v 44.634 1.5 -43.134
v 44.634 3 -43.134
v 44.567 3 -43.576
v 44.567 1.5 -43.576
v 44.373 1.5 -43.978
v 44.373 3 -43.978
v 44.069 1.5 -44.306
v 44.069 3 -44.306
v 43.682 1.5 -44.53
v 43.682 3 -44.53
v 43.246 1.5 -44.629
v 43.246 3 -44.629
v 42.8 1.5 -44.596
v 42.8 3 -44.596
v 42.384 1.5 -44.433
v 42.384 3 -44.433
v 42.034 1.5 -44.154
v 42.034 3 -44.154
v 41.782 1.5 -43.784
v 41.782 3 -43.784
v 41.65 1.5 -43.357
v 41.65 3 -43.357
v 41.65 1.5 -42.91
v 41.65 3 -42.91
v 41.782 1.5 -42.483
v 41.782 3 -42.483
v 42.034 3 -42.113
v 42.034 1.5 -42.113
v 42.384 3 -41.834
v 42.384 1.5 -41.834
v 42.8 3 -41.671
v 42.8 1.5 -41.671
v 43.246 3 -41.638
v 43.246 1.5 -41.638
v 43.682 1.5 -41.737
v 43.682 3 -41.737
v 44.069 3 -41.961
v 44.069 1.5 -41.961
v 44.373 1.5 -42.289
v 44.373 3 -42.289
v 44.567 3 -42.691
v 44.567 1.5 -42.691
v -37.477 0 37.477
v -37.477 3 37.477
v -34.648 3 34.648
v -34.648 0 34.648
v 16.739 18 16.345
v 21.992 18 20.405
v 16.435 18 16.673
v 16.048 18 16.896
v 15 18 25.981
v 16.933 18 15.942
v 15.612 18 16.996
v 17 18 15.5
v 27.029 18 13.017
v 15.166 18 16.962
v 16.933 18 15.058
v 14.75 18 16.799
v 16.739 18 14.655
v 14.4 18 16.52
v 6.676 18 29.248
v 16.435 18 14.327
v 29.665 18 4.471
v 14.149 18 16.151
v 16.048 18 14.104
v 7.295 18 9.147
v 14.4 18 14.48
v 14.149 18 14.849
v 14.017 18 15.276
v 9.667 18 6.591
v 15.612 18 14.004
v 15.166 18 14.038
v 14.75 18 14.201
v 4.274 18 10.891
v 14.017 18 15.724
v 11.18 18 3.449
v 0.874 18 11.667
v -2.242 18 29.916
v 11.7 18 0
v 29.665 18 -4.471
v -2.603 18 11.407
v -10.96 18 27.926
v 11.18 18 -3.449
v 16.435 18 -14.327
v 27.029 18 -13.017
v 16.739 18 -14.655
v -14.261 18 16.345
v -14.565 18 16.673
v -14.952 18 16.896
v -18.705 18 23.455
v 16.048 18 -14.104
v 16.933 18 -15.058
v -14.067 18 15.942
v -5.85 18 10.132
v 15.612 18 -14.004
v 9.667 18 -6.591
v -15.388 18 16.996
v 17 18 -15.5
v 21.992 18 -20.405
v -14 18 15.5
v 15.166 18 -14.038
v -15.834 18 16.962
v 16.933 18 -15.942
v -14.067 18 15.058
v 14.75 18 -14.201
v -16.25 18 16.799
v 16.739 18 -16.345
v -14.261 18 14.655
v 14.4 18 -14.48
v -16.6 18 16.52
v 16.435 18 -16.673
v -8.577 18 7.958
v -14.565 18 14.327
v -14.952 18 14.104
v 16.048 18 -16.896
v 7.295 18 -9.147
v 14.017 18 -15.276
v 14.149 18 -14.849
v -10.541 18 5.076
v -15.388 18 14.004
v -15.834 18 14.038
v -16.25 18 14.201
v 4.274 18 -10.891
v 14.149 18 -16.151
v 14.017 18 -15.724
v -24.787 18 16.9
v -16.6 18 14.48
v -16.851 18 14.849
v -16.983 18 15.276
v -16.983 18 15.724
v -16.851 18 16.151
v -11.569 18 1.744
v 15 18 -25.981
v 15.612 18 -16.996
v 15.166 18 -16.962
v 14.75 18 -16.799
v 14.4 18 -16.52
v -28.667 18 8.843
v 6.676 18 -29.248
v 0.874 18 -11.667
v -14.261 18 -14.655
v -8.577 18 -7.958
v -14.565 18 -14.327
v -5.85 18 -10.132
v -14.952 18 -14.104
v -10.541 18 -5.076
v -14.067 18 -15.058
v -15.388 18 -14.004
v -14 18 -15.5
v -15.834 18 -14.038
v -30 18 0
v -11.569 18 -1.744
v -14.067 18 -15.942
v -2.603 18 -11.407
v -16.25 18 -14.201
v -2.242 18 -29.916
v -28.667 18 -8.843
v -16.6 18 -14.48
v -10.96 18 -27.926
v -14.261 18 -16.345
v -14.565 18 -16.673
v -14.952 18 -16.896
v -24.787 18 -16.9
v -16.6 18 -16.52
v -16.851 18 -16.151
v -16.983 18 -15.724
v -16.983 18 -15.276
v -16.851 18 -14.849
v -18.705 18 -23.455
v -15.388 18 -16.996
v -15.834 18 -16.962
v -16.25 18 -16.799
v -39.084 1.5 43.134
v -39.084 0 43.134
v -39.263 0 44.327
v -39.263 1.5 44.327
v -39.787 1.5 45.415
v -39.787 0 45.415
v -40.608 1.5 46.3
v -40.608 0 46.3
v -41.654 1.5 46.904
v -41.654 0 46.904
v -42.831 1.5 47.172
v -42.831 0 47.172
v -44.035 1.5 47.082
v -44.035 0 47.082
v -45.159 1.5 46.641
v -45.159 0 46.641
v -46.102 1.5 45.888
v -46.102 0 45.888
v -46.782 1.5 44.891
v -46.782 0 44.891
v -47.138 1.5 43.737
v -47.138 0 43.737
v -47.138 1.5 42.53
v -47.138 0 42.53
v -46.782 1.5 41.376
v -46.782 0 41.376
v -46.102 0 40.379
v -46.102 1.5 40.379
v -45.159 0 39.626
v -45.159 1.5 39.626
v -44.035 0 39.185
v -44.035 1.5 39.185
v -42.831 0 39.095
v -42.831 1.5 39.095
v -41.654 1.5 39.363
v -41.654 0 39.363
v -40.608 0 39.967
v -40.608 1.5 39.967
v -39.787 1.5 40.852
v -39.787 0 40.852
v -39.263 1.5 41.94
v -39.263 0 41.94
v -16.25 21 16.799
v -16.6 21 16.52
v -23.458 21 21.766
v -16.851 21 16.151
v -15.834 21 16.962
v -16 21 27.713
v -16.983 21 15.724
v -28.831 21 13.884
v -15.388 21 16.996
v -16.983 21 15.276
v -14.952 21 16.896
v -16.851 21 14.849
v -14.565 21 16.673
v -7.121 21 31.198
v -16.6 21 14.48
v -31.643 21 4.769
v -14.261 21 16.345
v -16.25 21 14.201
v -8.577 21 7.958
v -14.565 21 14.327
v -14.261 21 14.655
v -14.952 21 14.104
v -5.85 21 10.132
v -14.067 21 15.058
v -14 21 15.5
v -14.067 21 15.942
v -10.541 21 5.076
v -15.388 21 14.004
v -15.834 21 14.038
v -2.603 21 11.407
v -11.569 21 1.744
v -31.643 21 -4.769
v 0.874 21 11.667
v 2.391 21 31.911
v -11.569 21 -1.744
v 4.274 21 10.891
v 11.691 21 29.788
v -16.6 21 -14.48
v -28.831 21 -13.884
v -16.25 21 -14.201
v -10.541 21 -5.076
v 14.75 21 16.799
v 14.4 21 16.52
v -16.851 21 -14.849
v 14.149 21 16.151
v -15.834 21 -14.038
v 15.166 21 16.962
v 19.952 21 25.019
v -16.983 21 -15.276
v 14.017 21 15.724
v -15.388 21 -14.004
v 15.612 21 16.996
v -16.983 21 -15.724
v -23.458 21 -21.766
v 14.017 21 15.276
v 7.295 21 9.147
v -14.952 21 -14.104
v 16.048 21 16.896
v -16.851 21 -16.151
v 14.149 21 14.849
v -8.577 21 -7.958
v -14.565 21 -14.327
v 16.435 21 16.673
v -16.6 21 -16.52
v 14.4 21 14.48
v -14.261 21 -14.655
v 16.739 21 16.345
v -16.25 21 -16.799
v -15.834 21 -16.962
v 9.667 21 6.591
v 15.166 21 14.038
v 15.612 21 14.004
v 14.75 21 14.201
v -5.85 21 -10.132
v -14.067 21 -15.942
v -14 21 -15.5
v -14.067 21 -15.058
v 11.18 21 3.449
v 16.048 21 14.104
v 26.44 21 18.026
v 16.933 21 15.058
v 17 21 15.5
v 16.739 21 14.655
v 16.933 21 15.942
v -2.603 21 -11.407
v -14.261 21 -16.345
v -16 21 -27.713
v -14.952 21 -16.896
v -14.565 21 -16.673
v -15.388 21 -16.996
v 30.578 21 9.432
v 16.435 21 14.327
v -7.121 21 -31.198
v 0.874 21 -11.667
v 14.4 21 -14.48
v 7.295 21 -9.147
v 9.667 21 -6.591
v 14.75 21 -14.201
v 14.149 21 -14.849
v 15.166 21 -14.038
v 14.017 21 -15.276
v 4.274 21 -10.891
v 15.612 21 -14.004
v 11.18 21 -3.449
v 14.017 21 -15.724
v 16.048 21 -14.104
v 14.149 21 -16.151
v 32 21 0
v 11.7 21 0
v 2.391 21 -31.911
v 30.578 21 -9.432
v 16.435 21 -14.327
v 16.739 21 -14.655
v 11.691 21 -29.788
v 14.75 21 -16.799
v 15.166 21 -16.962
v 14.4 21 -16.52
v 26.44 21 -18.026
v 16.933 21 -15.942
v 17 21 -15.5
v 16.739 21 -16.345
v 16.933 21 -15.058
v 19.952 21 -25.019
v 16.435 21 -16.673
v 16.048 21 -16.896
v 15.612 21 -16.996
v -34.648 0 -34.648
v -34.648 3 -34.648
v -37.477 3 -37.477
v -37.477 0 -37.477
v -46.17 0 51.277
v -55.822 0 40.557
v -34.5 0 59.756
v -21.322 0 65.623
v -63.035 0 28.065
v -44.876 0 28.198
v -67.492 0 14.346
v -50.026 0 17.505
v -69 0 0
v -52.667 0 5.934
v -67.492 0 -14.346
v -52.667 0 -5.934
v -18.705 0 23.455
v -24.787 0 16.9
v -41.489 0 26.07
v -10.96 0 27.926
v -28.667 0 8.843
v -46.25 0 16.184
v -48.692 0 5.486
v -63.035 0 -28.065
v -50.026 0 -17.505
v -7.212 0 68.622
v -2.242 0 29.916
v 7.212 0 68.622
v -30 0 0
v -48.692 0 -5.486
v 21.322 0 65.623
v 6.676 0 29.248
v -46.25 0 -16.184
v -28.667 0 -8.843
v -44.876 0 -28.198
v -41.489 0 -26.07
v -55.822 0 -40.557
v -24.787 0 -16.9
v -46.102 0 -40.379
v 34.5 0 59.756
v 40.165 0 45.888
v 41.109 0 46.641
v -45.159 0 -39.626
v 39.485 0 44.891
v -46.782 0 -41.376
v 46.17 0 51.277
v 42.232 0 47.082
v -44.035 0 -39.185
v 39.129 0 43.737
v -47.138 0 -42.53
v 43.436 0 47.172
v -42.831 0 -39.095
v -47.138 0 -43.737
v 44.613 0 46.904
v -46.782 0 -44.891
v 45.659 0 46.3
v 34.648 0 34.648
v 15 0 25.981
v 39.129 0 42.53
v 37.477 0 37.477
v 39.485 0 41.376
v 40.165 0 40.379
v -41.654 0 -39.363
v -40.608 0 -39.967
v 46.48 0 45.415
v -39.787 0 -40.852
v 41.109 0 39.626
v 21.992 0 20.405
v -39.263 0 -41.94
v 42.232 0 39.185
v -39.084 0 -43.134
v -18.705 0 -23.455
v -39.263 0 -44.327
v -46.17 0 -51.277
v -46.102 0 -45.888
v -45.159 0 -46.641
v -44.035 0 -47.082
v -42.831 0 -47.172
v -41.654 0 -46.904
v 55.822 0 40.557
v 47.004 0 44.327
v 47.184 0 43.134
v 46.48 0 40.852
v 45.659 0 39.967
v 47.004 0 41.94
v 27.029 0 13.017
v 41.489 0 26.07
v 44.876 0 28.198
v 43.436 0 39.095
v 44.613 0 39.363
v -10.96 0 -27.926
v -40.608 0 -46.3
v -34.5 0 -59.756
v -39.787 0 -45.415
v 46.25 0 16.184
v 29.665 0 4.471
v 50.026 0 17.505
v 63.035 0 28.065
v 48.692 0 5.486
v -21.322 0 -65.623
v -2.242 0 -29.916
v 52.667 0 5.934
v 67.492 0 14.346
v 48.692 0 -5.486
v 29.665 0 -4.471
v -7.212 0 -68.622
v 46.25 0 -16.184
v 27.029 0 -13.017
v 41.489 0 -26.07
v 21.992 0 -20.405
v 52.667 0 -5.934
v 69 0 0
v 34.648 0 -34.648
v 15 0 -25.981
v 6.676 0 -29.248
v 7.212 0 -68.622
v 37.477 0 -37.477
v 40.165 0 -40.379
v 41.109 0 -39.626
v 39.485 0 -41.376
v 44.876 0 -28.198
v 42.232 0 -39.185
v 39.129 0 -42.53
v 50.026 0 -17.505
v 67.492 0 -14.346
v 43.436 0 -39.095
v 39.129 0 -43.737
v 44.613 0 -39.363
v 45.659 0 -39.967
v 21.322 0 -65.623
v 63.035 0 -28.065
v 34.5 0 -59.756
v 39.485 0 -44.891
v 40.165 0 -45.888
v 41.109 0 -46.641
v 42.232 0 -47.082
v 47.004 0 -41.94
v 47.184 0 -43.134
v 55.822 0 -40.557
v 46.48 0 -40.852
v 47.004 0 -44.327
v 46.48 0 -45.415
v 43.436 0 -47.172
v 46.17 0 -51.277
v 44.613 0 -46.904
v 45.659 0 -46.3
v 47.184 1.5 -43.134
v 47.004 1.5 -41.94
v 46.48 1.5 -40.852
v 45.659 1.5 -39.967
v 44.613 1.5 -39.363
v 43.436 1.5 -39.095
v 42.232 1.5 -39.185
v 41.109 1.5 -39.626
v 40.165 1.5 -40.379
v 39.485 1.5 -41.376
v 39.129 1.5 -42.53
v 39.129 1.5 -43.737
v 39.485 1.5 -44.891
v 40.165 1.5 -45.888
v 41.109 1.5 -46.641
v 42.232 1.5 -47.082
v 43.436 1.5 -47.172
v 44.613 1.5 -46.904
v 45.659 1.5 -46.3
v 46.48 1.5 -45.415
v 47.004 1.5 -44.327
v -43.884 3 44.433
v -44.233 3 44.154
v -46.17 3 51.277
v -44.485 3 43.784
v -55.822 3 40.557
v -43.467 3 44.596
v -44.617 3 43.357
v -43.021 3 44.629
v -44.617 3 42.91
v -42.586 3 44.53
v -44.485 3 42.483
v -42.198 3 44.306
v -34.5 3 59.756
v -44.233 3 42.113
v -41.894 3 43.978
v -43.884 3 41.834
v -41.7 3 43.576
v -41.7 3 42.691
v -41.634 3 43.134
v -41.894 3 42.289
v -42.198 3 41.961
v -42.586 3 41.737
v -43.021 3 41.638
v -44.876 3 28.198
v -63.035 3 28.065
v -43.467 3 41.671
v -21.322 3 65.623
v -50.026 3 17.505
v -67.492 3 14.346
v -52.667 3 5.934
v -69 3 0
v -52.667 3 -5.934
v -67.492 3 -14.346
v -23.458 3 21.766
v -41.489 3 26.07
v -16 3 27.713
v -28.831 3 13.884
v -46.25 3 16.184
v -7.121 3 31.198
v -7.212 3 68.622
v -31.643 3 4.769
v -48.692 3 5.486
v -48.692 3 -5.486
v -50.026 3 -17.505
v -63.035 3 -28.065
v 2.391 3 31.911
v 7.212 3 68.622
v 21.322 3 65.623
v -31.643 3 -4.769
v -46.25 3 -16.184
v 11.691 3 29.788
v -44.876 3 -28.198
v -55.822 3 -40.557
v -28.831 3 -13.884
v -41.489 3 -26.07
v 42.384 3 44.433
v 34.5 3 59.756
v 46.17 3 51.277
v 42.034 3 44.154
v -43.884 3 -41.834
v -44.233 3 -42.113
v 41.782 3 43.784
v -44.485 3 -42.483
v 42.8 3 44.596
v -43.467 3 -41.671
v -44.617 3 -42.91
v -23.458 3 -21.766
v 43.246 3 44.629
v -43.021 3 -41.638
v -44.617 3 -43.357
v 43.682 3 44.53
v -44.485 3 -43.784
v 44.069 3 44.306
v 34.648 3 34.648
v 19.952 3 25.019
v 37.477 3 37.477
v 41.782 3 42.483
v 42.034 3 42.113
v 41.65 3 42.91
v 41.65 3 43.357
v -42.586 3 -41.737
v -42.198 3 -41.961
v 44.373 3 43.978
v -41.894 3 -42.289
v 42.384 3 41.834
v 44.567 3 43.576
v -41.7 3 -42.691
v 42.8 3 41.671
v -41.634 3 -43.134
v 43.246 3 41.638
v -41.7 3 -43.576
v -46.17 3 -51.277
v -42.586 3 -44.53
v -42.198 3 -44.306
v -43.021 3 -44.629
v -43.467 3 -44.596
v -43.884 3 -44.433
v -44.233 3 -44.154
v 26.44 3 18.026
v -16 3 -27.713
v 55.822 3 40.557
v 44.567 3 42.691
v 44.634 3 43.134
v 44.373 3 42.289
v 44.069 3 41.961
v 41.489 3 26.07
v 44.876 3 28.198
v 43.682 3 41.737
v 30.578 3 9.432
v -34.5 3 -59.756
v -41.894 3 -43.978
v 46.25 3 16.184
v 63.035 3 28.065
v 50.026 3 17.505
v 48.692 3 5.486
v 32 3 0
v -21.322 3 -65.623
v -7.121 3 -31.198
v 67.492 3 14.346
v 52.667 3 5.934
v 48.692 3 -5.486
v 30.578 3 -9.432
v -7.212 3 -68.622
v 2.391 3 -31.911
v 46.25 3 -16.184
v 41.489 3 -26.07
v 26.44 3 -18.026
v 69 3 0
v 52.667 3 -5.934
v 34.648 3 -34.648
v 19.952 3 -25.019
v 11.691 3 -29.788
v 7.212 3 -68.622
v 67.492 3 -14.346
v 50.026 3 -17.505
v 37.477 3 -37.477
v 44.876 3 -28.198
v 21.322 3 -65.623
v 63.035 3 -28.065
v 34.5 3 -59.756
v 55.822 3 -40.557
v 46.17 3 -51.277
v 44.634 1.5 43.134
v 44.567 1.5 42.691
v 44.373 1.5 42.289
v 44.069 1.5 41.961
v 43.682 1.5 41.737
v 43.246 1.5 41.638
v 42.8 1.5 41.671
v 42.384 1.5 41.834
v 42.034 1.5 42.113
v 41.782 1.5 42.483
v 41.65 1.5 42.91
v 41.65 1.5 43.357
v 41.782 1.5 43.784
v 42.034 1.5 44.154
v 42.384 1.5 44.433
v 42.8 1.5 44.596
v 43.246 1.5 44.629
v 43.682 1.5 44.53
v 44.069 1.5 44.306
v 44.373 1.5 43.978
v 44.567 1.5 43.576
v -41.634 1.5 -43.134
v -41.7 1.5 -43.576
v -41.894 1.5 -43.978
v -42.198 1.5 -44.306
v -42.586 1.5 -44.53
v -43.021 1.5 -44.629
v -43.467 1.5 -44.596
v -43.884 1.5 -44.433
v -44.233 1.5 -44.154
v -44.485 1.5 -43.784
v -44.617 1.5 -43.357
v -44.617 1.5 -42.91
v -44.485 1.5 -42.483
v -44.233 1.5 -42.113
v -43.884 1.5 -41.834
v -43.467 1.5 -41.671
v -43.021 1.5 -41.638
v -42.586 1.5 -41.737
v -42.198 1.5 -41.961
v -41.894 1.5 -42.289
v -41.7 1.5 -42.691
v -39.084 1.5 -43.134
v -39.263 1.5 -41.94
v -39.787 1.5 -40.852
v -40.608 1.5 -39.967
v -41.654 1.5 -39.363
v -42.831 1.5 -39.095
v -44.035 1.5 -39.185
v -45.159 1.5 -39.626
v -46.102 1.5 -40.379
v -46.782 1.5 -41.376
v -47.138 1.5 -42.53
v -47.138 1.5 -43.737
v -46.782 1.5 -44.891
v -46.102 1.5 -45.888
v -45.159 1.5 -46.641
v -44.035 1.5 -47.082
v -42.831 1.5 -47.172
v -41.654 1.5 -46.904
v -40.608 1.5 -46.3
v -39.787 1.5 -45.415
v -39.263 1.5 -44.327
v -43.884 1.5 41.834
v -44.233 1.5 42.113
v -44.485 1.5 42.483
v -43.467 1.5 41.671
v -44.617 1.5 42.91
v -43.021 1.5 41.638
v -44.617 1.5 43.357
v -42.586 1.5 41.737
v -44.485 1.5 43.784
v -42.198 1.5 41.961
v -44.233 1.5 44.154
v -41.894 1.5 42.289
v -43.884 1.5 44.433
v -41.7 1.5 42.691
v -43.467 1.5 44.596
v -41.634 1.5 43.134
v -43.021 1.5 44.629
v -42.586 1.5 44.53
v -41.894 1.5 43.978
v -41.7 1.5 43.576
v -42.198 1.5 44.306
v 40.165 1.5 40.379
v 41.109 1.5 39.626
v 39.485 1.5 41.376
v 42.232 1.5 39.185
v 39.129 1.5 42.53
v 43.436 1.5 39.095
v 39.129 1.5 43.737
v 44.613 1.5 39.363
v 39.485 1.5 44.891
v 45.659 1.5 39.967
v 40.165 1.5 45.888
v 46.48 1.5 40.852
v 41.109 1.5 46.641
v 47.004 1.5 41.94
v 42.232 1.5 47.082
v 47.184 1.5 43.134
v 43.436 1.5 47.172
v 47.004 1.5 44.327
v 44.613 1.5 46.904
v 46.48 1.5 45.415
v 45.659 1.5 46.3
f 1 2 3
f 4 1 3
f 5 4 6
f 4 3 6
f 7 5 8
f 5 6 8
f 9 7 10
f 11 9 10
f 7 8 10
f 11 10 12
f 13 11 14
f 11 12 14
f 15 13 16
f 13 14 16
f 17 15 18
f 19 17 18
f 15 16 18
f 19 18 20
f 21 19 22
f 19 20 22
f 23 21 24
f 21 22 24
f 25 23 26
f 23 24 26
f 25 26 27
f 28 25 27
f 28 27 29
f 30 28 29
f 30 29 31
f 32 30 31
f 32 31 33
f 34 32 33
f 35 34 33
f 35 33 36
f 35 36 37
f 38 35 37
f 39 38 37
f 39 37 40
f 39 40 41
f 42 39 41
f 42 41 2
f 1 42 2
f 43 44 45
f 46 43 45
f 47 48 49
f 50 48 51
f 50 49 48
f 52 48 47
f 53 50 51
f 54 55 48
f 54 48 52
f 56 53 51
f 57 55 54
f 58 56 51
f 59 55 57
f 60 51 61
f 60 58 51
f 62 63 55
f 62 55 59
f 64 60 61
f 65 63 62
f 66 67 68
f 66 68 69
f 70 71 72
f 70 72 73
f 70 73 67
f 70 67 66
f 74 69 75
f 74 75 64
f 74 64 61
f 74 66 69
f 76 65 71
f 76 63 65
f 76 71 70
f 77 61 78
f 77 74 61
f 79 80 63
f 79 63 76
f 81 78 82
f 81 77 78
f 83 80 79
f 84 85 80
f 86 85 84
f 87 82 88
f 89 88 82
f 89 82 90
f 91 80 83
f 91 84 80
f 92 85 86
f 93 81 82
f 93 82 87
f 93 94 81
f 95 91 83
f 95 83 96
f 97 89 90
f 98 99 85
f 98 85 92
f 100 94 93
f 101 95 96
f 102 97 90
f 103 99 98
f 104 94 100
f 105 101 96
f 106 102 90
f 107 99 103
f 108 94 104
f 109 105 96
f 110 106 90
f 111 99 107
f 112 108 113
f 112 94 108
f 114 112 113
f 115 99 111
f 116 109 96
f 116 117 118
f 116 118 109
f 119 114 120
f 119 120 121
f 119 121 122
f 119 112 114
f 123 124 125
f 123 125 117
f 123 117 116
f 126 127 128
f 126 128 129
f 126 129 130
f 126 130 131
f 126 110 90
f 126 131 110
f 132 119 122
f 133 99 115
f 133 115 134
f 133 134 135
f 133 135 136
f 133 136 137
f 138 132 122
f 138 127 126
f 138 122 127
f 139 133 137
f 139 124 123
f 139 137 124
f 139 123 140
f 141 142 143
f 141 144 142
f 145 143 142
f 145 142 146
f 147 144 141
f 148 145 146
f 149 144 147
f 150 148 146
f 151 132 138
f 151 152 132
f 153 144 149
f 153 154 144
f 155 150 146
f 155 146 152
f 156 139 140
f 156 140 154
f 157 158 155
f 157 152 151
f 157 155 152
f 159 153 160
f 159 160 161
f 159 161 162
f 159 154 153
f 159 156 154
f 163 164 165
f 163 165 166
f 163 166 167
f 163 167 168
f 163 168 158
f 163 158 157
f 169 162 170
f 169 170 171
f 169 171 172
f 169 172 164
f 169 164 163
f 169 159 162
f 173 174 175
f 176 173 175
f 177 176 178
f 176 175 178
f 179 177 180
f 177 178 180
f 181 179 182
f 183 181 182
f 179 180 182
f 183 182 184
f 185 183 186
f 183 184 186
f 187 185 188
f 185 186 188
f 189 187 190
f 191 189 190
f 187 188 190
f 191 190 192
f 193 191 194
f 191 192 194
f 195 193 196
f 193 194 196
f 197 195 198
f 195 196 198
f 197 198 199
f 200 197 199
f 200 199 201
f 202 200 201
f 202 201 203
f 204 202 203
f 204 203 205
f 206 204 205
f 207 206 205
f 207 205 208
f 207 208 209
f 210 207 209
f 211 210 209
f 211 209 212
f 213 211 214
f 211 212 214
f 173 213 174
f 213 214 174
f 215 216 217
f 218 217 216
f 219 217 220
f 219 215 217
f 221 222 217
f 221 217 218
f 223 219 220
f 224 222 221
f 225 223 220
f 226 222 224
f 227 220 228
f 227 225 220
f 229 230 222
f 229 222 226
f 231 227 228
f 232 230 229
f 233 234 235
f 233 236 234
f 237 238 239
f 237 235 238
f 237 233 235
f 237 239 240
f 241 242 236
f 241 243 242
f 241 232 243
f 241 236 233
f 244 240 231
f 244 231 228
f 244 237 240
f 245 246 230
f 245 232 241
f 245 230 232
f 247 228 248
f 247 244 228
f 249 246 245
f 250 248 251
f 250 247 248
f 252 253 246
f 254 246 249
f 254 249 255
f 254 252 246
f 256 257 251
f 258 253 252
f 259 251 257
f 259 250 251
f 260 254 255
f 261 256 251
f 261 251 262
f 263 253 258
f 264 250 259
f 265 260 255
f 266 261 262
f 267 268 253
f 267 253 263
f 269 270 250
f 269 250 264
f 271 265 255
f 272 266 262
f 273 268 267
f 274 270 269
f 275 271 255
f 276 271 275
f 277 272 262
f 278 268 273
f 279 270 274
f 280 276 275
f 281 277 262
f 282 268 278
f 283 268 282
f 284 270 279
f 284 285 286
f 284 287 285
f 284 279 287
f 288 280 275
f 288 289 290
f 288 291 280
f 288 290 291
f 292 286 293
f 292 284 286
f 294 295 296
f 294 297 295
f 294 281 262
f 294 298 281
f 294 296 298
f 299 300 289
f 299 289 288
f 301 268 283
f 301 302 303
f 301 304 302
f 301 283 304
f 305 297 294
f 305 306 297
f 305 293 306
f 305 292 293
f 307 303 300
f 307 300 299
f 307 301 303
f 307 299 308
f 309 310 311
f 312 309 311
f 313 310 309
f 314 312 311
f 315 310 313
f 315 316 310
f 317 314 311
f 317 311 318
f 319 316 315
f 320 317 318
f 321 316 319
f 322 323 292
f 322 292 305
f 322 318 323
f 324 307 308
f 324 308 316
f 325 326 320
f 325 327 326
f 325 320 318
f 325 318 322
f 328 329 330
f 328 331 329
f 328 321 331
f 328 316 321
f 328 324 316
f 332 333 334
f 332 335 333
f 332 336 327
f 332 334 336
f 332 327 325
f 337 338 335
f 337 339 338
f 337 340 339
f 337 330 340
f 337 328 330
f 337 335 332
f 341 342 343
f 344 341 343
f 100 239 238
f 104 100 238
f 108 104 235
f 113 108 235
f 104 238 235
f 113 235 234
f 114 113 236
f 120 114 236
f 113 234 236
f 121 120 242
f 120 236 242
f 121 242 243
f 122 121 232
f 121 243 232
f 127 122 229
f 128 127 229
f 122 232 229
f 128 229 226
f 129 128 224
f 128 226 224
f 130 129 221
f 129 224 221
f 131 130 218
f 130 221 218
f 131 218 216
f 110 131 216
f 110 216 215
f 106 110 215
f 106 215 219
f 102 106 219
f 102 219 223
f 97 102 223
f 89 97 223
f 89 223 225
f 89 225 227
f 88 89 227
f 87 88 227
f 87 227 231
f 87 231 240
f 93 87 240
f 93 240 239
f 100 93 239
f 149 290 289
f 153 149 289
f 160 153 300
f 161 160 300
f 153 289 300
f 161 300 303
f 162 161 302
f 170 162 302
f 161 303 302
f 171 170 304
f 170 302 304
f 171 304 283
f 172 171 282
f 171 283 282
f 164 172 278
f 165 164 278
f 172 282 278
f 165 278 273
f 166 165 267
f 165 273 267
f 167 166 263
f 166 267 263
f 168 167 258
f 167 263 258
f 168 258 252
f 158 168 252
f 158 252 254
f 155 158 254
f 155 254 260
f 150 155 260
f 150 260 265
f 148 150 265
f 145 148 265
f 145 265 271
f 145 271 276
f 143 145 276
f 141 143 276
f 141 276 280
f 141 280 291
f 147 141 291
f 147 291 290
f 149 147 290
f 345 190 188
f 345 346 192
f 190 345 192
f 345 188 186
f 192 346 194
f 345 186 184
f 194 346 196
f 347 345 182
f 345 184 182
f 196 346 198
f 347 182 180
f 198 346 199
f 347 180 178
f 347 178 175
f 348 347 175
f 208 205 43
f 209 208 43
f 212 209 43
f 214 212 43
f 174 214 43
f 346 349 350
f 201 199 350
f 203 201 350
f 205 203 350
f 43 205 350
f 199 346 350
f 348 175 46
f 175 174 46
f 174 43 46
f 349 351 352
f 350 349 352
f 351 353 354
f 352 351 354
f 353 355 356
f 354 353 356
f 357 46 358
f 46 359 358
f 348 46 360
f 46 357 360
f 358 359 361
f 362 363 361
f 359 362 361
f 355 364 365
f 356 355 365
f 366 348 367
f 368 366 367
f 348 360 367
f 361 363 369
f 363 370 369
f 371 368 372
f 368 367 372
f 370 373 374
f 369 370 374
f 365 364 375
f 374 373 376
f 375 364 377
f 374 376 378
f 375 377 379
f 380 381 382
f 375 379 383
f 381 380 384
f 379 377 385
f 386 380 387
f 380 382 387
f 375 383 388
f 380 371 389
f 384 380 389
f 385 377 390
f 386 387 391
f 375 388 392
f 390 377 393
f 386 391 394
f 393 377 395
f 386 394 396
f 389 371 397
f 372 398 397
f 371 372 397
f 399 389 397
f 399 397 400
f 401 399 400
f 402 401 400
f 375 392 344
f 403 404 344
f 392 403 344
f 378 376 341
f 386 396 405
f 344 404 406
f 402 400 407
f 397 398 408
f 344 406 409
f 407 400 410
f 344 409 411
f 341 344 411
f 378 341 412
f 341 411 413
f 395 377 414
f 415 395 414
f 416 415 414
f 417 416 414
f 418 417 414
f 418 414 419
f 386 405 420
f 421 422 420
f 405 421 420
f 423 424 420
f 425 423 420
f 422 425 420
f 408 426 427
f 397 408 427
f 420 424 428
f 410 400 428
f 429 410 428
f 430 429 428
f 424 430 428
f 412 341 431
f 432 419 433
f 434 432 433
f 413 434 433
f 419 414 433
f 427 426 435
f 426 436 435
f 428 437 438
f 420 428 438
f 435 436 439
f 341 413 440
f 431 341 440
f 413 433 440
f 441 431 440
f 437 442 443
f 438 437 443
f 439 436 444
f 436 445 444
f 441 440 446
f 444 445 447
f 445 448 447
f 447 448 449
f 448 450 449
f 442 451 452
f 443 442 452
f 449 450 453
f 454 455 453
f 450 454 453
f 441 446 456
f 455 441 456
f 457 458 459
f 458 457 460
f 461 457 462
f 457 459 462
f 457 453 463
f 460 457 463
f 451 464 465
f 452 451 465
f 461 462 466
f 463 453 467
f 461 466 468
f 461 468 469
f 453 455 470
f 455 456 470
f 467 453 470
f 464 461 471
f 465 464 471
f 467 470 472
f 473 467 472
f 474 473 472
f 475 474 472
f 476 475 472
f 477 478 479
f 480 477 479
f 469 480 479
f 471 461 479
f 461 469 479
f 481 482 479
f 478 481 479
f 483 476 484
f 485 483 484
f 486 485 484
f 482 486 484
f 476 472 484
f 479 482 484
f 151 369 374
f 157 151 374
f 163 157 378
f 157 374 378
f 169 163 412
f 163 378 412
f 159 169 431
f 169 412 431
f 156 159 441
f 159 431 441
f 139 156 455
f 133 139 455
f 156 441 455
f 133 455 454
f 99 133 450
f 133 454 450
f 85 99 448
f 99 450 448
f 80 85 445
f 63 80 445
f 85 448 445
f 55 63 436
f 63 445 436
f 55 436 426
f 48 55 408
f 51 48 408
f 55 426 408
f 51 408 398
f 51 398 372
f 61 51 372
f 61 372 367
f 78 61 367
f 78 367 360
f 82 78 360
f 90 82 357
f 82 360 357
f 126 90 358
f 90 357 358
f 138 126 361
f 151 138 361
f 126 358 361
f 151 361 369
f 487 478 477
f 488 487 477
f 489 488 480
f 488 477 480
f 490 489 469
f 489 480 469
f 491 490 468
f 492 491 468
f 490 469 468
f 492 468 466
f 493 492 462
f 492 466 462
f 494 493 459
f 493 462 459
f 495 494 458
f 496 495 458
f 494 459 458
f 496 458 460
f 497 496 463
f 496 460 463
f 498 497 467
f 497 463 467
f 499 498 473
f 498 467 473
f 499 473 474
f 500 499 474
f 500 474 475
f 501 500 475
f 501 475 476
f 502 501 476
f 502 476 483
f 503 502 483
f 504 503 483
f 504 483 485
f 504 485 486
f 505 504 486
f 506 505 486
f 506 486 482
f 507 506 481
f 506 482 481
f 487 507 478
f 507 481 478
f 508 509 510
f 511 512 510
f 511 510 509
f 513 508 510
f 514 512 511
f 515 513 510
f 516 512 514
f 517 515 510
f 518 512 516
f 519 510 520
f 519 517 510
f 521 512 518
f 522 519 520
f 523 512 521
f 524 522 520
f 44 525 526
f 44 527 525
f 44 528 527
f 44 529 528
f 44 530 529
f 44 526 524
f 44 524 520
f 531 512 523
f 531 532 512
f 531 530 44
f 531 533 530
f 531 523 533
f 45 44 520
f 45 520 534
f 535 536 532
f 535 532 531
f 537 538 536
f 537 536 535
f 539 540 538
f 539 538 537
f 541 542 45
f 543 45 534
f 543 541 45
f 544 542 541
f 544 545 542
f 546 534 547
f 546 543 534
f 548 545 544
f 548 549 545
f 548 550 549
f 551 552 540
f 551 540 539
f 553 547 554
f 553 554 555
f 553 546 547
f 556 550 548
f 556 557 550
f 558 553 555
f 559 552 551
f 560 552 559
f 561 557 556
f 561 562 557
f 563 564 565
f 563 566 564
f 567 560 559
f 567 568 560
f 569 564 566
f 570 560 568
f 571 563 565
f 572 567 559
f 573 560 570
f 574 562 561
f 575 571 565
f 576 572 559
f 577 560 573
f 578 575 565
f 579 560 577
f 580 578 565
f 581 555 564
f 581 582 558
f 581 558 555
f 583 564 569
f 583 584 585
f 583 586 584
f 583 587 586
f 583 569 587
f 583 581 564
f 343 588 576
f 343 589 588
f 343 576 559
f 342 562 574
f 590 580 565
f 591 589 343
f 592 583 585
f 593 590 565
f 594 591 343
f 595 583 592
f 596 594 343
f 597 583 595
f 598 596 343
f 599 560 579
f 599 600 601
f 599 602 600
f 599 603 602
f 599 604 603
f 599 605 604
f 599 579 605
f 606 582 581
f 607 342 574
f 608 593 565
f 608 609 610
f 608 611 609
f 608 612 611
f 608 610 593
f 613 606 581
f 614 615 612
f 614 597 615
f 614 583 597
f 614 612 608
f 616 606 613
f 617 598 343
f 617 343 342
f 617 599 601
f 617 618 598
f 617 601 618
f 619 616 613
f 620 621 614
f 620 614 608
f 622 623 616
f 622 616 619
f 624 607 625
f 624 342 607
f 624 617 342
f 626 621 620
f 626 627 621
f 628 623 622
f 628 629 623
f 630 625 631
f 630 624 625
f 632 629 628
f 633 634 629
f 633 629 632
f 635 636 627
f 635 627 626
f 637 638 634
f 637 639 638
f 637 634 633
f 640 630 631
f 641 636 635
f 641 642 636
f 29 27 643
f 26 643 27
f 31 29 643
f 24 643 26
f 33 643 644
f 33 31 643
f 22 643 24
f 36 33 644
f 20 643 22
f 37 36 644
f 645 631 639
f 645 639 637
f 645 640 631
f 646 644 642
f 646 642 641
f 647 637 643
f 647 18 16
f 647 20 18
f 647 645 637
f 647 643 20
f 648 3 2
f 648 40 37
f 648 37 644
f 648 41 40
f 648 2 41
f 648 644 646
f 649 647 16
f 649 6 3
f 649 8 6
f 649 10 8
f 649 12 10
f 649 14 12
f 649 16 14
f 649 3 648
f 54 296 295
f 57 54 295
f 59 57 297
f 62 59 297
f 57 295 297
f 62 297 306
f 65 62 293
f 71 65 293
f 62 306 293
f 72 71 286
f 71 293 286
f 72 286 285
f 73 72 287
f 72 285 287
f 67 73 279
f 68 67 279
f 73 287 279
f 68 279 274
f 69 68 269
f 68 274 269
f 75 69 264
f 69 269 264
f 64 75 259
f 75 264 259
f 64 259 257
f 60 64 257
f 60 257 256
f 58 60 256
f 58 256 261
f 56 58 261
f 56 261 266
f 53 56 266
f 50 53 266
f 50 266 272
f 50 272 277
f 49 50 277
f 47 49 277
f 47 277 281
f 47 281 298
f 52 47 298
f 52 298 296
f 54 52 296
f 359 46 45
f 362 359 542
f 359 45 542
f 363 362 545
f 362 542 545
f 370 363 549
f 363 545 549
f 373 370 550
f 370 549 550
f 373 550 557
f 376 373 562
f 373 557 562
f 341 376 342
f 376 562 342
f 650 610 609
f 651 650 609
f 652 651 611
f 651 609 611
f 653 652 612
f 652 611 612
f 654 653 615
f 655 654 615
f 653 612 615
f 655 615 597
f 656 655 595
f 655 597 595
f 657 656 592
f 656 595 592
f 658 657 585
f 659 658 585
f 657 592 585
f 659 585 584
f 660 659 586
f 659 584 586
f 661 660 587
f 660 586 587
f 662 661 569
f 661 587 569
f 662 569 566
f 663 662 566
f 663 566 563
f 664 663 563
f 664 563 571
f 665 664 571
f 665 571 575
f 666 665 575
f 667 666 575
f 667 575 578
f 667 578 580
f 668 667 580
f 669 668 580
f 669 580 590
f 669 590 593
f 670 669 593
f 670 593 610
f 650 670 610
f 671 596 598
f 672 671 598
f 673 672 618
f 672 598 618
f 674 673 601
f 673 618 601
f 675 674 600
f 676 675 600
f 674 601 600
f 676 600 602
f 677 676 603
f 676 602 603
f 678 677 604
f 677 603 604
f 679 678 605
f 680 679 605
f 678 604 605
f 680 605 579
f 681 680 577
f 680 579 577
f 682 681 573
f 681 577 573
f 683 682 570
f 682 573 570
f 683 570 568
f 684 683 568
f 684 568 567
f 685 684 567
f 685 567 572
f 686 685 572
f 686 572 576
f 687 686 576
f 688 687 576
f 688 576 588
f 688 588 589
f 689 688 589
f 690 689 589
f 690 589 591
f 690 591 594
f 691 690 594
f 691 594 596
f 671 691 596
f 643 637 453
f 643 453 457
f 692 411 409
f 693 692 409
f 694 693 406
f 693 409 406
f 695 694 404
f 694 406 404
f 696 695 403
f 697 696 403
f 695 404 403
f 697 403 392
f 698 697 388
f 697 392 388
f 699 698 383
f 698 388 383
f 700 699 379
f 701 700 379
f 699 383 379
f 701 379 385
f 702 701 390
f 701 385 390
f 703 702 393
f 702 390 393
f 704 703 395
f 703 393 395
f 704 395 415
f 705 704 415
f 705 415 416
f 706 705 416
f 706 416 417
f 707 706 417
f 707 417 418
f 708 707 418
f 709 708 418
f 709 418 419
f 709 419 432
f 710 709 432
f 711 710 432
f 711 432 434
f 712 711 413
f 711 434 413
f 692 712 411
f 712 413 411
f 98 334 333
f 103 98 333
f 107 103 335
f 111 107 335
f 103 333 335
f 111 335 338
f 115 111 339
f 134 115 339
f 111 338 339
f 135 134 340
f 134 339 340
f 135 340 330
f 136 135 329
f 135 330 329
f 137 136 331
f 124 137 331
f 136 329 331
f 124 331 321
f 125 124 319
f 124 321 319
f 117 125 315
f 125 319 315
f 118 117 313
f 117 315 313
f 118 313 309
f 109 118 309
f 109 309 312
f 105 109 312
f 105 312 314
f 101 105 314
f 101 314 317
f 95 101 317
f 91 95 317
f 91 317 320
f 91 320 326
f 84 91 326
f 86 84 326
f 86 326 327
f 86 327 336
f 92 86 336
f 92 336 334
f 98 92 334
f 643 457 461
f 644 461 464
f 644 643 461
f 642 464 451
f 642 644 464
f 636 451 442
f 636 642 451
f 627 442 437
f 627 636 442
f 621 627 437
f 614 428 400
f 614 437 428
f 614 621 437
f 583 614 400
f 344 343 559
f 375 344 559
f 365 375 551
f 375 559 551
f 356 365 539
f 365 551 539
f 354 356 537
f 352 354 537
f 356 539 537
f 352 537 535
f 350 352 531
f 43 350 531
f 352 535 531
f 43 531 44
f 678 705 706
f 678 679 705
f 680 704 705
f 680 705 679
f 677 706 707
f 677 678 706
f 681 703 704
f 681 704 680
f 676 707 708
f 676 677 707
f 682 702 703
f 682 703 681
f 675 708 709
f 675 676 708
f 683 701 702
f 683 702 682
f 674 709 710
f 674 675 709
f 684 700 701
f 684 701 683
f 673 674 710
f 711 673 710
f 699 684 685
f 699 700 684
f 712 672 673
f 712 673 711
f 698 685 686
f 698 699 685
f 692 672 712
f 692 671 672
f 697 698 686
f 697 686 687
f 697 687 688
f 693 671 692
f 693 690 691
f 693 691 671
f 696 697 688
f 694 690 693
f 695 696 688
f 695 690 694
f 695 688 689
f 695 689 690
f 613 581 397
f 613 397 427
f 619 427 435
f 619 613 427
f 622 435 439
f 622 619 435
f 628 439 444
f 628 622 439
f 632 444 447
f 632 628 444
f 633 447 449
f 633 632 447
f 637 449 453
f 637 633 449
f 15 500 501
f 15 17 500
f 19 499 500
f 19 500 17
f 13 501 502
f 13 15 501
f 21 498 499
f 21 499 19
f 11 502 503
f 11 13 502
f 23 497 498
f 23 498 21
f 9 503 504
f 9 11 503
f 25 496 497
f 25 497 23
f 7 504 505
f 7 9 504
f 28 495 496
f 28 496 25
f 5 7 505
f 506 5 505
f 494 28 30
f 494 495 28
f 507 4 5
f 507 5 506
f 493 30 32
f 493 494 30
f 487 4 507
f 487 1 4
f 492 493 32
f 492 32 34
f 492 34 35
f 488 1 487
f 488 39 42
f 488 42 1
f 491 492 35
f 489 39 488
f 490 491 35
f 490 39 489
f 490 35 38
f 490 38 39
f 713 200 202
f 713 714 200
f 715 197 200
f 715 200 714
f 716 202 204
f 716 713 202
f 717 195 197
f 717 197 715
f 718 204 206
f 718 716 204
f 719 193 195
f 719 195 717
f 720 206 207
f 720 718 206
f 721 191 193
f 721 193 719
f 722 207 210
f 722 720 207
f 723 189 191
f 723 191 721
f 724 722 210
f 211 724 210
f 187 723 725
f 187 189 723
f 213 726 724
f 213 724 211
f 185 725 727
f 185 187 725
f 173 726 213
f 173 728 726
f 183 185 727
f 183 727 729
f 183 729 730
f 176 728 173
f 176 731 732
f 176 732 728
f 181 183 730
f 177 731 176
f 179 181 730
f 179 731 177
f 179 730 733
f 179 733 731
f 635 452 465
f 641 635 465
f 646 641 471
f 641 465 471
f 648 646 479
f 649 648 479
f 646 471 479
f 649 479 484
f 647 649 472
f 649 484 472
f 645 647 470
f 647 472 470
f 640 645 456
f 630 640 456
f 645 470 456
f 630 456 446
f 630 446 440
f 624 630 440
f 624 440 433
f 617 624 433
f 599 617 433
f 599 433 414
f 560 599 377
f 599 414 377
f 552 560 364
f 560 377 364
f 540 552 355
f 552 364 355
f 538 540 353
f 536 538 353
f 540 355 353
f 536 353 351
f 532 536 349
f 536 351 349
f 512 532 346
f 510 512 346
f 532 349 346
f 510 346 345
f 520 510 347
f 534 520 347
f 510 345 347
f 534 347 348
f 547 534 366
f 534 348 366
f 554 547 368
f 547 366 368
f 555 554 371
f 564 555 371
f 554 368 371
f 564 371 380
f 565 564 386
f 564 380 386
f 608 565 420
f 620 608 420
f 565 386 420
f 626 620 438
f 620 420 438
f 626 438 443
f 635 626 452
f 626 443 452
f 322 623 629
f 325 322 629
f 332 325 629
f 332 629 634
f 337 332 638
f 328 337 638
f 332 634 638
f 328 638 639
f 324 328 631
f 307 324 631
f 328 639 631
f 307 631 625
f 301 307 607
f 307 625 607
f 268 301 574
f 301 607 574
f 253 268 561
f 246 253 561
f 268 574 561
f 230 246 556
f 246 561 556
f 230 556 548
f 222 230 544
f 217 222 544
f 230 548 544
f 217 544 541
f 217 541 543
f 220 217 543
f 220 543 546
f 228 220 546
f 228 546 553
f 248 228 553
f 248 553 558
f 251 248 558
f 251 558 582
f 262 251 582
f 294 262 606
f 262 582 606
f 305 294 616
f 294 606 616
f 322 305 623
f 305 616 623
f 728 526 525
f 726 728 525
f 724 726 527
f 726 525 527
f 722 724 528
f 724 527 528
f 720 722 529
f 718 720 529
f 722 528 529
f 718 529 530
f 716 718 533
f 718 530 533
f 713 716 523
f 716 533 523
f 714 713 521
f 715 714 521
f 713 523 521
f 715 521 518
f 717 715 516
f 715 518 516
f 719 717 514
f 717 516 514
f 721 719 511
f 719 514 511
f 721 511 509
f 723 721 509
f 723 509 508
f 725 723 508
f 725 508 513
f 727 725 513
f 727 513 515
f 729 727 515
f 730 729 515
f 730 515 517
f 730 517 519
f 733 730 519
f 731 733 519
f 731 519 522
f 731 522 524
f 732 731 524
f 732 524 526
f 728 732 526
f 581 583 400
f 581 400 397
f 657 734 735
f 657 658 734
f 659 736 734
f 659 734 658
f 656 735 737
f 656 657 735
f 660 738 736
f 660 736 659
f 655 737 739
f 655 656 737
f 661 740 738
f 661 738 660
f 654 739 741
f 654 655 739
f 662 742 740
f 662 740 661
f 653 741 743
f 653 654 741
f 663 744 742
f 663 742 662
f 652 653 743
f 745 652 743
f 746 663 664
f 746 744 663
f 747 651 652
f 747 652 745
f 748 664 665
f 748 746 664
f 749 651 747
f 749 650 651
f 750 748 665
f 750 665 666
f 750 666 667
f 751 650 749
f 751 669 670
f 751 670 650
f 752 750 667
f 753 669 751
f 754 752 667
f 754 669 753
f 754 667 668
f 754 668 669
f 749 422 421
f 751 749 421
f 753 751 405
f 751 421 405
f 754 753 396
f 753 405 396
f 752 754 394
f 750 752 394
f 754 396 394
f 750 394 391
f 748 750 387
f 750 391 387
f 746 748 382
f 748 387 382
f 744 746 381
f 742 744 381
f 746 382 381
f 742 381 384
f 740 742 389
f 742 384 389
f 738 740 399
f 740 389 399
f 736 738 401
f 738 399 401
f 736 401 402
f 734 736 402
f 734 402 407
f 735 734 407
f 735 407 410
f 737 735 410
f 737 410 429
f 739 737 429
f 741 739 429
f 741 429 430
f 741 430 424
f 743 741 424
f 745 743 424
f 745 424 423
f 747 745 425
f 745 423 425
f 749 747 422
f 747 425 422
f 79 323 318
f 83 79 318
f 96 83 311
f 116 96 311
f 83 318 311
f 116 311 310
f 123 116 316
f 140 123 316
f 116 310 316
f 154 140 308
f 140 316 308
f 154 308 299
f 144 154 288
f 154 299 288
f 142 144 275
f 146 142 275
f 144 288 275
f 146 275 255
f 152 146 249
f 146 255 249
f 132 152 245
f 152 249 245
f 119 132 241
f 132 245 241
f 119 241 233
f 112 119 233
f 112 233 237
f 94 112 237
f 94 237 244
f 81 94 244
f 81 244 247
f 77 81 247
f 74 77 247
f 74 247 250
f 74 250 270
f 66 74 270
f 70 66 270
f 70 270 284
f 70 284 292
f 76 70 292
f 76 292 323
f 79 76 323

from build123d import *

# Parameters (mm, degrees)
SKETCH1_R           = 69
BOSS_EXTRUDE1_DEPTH = 3
SKETCH2_R           = 32
BOSS_EXTRUDE2_DEPTH = 18
SKETCH3_R           = 11.7
SKETCH3_R_2         = 1.5
CUT_EXTRUDE1_DEPTH  = 22
SKETCH6_R           = 30
CUT_EXTRUDE3_DEPTH  = 18
SKETCH7_R           = 1.5
CUT_EXTRUDE5_DEPTH  = 4
SKETCH8_R           = 4.05
CUT_EXTRUDE6_DEPTH  = 1.5


with BuildPart() as part:
    # Sketch1 → Boss-Extrude1 (new body)
    with BuildSketch(Plane(origin=(0, 0, 0), x_dir=(1, 0, 0), z_dir=(0, 1, 0))):
        Circle(SKETCH1_R)
    extrude(amount=BOSS_EXTRUDE1_DEPTH)

    # Sketch2 → Boss-Extrude2 (add)
    with BuildSketch(Plane(origin=(0, 3, 0), x_dir=(1, 0, 0), z_dir=(0, 1, 0))):
        Circle(SKETCH2_R)
    extrude(amount=BOSS_EXTRUDE2_DEPTH)

    # Sketch3 → Cut-Extrude1 (cut, through all)
    with BuildSketch(Plane(origin=(0, 21, 0), x_dir=(1, 0, 0), z_dir=(0, 1, 0))):
        Circle(SKETCH3_R)
        with Locations((15.5, 15.5)):
            Circle(SKETCH3_R_2)
        with Locations((-15.5, 15.5)):
            Circle(SKETCH3_R_2)
        with Locations((15.5, -15.5)):
            Circle(SKETCH3_R_2)
        with Locations((-15.5, -15.5)):
            Circle(SKETCH3_R_2)
    extrude(amount=-CUT_EXTRUDE1_DEPTH, mode=Mode.SUBTRACT)

    # Sketch6 → Cut-Extrude3 (cut)
    with BuildSketch(Plane(origin=(0, 0, 0), x_dir=(-1, 0, 0), z_dir=(0, -1, 0))):
        Circle(SKETCH6_R)
    extrude(amount=-CUT_EXTRUDE3_DEPTH, mode=Mode.SUBTRACT)

    # Sketch7 → Cut-Extrude5 (cut, through all)
    with BuildSketch(Plane(origin=(0, 3, 0), x_dir=(1, 0, 0), z_dir=(0, 1, 0))):
        with Locations((43.133513652, 43.133513652)):
            Circle(SKETCH7_R)
        with Locations((43.133513652, -43.133513652)):
            Circle(SKETCH7_R)
        with Locations((-43.133513652, -43.133513652)):
            Circle(SKETCH7_R)
        with Locations((-43.133513652, 43.133513652)):
            Circle(SKETCH7_R)
        with BuildLine():
            Line((34.648232278, 34.648232278), (37.476659403, 37.476659403))
            ThreePointArc((37.476659403, 37.476659403), (53, 0), (37.476659403, -37.476659403))
            Line((37.476659403, -37.476659403), (34.648232278, -34.648232278))
            ThreePointArc((34.648232278, -34.648232278), (49, 0), (34.648232278, 34.648232278))
        make_face()
        with BuildLine():
            Line((-37.476659403, -37.476659403), (-34.648232278, -34.648232278))
            ThreePointArc((-34.648232278, -34.648232278), (-49, 0), (-34.648232278, 34.648232278))
            Line((-34.648232278, 34.648232278), (-37.476659403, 37.476659403))
            ThreePointArc((-37.476659403, 37.476659403), (-53, 0), (-37.476659403, -37.476659403))
        make_face()
    extrude(amount=-CUT_EXTRUDE5_DEPTH, mode=Mode.SUBTRACT)

    # Sketch8 → Cut-Extrude6 (cut)
    with BuildSketch(Plane.XZ):
        with Locations((-43.133513652, 43.133513652)):
            Circle(SKETCH8_R)
        with Locations((43.133513652, 43.133513652)):
            Circle(SKETCH8_R)
        with Locations((43.133513652, -43.133513652)):
            Circle(SKETCH8_R)
        with Locations((-43.133513652, -43.133513652)):
            Circle(SKETCH8_R)
    extrude(amount=-CUT_EXTRUDE6_DEPTH, mode=Mode.SUBTRACT)


solid = part.part
